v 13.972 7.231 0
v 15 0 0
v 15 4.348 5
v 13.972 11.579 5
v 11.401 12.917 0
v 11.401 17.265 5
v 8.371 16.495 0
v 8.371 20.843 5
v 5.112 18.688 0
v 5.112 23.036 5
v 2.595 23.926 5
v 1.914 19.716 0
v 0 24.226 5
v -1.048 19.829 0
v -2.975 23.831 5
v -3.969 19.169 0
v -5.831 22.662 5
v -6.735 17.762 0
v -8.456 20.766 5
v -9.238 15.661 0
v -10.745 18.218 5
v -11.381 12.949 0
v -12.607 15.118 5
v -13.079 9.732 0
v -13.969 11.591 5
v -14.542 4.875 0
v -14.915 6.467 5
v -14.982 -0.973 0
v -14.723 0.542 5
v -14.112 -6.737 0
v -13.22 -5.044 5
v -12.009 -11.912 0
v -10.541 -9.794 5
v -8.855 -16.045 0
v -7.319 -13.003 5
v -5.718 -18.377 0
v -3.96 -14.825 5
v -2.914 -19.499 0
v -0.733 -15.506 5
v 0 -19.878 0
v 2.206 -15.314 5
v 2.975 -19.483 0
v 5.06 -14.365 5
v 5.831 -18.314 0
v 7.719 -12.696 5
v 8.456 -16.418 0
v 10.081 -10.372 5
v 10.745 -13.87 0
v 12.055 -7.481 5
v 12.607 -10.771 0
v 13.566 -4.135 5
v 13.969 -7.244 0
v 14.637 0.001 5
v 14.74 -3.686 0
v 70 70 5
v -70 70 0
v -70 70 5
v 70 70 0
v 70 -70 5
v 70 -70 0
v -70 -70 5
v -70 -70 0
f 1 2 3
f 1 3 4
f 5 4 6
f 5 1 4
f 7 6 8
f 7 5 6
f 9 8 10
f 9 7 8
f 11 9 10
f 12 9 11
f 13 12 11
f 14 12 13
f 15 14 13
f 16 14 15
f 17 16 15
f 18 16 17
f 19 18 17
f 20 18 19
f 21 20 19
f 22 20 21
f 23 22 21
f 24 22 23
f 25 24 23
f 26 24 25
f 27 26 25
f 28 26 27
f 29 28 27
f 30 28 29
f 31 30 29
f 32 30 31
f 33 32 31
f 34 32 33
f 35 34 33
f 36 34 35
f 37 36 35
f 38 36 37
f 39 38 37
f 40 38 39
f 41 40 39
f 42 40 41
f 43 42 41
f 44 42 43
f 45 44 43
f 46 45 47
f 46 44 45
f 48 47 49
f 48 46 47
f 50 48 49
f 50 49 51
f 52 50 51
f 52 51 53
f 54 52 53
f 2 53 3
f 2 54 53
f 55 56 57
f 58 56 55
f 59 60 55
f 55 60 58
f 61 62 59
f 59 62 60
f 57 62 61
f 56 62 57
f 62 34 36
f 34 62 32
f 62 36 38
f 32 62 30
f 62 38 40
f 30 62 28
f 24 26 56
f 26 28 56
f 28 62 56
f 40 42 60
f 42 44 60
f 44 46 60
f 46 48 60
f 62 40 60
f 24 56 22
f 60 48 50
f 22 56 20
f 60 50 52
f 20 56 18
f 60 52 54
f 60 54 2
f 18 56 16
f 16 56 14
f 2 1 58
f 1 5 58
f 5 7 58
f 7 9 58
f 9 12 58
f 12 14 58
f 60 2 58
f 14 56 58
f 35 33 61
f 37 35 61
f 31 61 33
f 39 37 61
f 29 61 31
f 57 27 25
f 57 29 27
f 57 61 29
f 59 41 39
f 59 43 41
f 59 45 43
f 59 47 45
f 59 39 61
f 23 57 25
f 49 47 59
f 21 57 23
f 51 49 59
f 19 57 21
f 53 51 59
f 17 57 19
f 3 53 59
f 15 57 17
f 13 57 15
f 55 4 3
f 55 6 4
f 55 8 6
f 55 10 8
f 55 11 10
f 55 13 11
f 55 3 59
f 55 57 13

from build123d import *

# Parameters (mm, degrees)
SKETCH1_W           = 140
SKETCH1_H           = 140
BOSS_EXTRUDE1_DEPTH = 5
CAVITY1_START       = -13.043478361
CAVITY1_OUTLINE_R   = 15
CAVITY1_DEPTH       = 32.712935267


# Read off the part's stored shape, not the designer's step: Cavity1
with BuildPart() as part:
    # Sketch1 → Boss-Extrude1 (new body)
    with BuildSketch(Plane.XY):
        Rectangle(SKETCH1_W, SKETCH1_H)
    extrude(amount=BOSS_EXTRUDE1_DEPTH)

    # Cavity1 outline → Cavity1 (cut)
    with BuildSketch(Plane(origin=(0, 0, 0), x_dir=(1, 0, 0), z_dir=(0, 0.6561787149247867, 0.7546055221635047)).offset(CAVITY1_START)):
        Circle(CAVITY1_OUTLINE_R)
    extrude(amount=CAVITY1_DEPTH, mode=Mode.SUBTRACT)


solid = part.part
